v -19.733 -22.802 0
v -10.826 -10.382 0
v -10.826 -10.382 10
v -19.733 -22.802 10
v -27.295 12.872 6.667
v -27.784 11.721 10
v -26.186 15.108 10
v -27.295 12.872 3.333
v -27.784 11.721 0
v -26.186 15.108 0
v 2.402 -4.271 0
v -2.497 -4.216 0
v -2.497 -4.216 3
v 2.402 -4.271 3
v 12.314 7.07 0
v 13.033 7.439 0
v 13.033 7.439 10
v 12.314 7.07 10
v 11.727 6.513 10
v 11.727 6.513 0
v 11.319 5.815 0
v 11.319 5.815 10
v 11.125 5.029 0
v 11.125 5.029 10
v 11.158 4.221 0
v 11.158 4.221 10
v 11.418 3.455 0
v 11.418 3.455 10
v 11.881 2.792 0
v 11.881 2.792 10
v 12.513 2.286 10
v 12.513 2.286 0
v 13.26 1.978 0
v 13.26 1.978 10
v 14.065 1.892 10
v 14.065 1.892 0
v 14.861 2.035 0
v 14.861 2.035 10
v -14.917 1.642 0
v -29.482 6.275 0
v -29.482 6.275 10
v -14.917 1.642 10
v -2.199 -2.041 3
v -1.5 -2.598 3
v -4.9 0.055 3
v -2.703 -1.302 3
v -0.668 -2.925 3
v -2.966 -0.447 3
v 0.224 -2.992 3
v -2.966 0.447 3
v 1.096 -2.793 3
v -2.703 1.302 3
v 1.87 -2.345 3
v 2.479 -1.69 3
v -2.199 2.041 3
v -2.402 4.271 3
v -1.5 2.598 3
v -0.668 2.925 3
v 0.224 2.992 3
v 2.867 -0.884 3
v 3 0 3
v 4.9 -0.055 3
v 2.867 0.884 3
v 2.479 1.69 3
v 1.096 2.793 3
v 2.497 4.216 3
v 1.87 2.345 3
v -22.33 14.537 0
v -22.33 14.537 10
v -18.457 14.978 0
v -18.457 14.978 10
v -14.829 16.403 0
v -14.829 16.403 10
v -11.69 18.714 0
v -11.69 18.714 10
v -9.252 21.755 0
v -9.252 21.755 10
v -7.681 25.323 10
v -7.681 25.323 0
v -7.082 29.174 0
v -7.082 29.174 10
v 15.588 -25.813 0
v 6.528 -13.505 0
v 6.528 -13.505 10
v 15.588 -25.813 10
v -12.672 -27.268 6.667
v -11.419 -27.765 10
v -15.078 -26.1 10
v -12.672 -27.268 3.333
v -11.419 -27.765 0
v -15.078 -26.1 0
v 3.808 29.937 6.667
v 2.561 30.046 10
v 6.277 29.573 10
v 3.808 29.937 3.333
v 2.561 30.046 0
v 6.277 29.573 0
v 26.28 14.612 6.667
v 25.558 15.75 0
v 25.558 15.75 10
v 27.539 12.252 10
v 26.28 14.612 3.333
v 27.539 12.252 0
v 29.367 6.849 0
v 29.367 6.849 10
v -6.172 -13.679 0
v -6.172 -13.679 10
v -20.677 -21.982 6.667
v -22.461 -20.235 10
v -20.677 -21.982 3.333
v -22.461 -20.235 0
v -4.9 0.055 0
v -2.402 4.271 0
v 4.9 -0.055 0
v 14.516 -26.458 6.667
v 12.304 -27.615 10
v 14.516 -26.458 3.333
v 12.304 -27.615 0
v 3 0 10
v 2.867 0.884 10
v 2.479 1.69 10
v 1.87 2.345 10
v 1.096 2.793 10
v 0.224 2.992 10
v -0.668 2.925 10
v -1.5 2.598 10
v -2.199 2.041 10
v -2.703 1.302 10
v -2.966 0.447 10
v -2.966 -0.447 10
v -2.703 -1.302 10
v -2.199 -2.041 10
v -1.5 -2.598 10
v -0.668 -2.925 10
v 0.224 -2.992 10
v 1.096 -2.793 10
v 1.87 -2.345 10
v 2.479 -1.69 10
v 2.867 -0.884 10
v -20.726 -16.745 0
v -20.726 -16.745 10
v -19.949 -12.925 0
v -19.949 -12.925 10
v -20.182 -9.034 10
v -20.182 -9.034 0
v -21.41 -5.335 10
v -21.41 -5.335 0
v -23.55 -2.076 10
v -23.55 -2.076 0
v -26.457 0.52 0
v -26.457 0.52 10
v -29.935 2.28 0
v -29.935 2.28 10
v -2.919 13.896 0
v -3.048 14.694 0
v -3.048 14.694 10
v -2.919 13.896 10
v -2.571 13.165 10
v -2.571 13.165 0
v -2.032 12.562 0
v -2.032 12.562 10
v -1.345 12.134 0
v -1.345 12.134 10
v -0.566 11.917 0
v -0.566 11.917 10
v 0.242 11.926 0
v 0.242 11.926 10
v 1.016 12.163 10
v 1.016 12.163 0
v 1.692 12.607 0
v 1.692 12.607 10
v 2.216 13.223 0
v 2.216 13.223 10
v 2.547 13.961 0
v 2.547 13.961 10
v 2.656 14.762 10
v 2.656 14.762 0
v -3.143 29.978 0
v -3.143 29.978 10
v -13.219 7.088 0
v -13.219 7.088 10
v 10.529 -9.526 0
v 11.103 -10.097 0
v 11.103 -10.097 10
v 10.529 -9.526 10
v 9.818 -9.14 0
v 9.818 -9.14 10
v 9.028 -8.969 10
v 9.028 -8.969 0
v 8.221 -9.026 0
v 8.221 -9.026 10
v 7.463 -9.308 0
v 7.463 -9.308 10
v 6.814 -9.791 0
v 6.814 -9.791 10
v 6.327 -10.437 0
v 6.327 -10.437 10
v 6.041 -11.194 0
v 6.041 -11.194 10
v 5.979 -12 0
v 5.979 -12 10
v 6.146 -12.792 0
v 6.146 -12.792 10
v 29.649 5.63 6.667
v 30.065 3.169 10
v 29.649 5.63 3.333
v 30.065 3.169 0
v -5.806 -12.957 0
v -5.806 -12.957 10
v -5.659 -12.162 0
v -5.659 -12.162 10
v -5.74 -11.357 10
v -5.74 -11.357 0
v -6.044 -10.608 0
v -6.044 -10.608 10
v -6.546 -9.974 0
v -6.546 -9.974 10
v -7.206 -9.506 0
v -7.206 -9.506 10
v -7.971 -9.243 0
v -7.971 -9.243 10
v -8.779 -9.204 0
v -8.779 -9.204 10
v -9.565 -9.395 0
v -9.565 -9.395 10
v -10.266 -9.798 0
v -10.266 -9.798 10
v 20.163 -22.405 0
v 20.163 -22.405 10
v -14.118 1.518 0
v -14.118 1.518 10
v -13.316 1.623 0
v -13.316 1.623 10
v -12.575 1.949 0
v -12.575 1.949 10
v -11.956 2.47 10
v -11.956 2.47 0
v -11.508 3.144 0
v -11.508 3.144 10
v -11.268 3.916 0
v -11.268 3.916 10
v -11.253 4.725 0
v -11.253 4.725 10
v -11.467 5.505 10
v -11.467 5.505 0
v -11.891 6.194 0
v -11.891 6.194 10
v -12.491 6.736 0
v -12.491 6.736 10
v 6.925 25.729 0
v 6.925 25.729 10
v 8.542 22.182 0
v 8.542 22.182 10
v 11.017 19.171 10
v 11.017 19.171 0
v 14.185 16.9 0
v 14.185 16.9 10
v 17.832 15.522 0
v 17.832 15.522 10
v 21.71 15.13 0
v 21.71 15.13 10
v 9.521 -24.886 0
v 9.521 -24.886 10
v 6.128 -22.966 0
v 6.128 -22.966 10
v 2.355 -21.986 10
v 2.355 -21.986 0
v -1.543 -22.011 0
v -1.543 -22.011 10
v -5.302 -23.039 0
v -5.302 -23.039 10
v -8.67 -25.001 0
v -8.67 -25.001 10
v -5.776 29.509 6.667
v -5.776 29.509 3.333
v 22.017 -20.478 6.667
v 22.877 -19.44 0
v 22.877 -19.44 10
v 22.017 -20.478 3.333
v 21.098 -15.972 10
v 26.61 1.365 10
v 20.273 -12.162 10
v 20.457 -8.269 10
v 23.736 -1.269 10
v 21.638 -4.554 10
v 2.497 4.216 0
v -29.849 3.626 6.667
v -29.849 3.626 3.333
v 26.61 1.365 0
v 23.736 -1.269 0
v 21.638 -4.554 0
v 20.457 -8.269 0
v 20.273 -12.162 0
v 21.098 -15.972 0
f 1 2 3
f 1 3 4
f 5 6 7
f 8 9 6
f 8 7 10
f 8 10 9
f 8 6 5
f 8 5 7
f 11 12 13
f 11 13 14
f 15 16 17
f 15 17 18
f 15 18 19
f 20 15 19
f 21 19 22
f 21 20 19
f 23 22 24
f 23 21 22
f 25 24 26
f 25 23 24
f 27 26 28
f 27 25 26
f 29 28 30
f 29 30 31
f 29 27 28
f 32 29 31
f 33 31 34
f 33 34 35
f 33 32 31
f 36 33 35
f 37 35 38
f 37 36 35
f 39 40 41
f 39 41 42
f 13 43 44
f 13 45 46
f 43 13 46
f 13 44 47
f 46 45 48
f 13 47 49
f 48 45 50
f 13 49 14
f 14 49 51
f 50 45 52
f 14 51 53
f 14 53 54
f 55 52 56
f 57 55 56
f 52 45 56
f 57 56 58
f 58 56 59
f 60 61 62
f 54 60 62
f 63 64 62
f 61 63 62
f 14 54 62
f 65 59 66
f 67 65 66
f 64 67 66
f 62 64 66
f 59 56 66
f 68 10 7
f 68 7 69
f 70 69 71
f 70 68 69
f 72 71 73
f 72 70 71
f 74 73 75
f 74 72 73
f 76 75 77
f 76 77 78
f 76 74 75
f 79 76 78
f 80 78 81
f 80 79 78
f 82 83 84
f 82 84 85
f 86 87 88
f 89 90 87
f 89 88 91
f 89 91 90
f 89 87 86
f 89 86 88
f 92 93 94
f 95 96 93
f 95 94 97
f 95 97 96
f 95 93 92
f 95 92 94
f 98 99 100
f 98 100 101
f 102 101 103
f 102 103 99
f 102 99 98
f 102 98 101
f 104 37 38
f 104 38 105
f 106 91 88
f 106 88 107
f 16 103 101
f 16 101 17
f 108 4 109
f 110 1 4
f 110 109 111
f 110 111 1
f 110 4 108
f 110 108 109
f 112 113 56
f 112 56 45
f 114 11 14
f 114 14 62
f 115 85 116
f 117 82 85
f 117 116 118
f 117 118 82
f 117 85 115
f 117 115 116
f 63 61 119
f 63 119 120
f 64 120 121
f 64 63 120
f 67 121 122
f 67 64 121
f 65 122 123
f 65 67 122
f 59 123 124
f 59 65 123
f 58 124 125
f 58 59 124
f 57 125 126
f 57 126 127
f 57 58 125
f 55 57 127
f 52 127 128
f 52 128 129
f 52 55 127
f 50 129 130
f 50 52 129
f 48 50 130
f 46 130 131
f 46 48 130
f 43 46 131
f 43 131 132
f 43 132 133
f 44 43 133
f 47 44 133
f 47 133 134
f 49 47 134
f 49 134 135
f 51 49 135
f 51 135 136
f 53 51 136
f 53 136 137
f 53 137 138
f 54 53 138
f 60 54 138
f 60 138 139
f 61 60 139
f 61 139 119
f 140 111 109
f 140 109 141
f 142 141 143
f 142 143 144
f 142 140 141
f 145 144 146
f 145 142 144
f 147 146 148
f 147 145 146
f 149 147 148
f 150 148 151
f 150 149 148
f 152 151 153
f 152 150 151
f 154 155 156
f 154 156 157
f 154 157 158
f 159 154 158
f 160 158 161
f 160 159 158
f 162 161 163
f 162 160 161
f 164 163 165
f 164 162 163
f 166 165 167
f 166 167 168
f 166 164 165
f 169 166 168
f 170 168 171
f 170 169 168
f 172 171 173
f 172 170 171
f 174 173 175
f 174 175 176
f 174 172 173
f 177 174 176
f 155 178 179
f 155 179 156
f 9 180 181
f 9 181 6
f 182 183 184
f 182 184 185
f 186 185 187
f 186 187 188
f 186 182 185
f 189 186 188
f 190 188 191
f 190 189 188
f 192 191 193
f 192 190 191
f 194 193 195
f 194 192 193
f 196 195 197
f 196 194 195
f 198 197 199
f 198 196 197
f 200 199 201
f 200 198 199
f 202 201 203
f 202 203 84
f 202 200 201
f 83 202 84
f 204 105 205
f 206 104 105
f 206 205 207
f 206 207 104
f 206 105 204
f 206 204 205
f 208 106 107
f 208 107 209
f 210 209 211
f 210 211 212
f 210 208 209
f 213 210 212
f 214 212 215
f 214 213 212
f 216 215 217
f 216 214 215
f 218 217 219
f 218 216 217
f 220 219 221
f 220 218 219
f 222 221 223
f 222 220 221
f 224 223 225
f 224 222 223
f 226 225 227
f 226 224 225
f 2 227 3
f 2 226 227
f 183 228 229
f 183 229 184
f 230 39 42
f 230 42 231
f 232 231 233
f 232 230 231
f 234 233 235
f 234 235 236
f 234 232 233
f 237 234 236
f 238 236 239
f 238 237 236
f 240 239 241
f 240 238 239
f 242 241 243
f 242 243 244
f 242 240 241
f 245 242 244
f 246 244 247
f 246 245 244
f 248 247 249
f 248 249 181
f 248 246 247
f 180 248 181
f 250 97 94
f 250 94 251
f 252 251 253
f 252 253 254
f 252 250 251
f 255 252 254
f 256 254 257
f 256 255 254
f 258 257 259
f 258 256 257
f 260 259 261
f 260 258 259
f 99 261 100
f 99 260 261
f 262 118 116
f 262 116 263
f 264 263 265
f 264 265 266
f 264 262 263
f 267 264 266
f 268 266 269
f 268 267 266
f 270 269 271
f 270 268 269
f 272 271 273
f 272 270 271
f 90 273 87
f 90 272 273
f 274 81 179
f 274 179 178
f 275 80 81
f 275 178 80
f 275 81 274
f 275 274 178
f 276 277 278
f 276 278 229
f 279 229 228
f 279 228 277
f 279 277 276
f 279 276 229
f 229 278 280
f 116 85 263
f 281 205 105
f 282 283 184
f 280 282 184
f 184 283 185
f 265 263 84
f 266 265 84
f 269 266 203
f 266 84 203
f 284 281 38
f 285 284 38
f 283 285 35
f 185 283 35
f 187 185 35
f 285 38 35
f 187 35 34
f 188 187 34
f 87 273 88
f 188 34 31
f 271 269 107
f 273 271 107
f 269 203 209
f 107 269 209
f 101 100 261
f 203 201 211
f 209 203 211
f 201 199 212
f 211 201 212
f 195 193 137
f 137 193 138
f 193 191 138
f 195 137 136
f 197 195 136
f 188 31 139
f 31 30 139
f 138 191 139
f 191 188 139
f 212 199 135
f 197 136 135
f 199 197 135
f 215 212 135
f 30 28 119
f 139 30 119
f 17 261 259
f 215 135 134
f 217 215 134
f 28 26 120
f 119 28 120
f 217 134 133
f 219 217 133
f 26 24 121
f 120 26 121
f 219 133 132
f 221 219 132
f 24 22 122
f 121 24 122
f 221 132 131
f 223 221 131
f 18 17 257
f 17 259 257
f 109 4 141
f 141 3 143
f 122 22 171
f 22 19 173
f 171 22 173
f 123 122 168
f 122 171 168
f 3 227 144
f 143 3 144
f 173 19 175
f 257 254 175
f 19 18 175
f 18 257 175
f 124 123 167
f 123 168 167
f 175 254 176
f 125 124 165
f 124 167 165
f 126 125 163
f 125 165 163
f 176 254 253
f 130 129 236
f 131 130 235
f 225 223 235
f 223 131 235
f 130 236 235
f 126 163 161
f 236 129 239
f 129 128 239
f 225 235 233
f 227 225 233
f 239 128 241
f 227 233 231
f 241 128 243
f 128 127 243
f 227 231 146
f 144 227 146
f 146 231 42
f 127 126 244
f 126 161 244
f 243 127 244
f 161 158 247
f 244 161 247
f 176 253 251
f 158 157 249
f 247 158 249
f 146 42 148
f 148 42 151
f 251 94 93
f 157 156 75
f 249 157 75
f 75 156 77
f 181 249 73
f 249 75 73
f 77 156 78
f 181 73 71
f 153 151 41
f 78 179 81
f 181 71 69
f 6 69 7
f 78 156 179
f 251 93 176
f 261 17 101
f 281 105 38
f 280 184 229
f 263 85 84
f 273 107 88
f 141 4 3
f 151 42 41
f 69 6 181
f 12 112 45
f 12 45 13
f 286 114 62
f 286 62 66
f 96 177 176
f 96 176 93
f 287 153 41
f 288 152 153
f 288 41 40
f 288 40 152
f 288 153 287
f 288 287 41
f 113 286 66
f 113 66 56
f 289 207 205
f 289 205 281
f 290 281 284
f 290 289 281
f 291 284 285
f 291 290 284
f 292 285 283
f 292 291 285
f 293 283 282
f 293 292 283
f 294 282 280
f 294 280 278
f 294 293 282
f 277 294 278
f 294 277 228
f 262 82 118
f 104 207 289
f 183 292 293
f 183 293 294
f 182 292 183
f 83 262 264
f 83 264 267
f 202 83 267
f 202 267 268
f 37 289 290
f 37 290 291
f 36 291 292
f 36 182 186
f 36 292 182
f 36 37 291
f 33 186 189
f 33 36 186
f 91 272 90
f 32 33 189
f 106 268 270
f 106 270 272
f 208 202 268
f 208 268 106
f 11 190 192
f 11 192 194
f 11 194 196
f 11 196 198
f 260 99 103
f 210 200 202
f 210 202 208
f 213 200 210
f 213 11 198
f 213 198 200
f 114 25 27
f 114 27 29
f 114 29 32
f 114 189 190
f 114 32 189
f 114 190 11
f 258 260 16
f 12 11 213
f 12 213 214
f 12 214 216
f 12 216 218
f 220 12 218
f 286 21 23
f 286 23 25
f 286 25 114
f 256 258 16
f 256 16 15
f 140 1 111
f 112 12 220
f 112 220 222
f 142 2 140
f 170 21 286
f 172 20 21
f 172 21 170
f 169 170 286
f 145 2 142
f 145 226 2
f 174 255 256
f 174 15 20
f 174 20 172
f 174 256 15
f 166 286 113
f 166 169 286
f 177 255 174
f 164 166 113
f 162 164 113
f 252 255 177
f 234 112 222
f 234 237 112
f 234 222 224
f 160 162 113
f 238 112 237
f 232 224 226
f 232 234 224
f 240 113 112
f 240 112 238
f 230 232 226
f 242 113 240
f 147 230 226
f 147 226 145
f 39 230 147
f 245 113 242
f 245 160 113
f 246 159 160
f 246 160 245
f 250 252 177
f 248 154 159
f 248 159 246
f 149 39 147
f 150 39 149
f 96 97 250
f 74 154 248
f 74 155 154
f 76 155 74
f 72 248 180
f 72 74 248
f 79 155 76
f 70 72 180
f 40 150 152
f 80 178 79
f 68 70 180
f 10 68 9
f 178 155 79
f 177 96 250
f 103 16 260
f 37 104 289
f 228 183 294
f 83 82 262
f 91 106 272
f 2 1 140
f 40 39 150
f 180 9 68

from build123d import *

# Parameters (mm, degrees)
MODEL_R                 = 3
BOSS_EXTRUDE3_DEPTH     = 10
CUT_EXTRUDE1_DEPTH      = 3
CUT_EXTRUDE1_DEPTH_BACK = 3


with BuildPart() as part:
    # Model → Boss-Extrude3 (new body)
    with BuildSketch(Plane.XY):
        with BuildLine():
            add(Edge.make_bspline(
                [(-27.783884398, 11.720720152), (-27.312273784, 12.880782387), (-26.795019787, 14.018174114), (-26.185754442, 15.108459083)],
                knots=[0.852290179, 0.852290179, 0.852290179, 0.852290179, 0.87243197, 0.87243197, 0.87243197, 0.87243197], degree=3))
            ThreePointArc((-26.185754442, 15.108459083), (-13.183686547, 17.45567821), (-7.081525862, 29.174331808))
            add(Edge.make_bspline(
                [(-7.081525862, 29.174331808), (-5.777480255, 29.53777265), (-4.469238519, 29.818781923), (-3.142641746, 29.977736074)],
                knots=[0, 0, 0, 0, 0.021616293, 0.021616293, 0.021616293, 0.021616293], degree=3))
            Line((-3.142641746, 29.977736074), (-3.047607508, 14.694279391))
            ThreePointArc((-3.047607508, 14.694279391), (-0.161689439, 11.892698747), (2.656409066, 14.762489335))
            Line((2.656409066, 14.762489335), (2.561374827, 30.045946018))
            add(Edge.make_bspline(
                [(2.561374827, 30.045946018), (3.81039527, 29.955896616), (5.051959359, 29.815432204), (6.277155329, 29.572903012)],
                knots=[0.052290179, 0.052290179, 0.052290179, 0.052290179, 0.07243197, 0.07243197, 0.07243197, 0.07243197], degree=3))
            ThreePointArc((6.277155329, 29.572903012), (12.527353316, 17.932532214), (25.558126537, 15.750295644))
            add(Edge.make_bspline(
                [(25.558126537, 15.750295644), (26.306751572, 14.62238397), (26.978276202, 13.465008783), (27.53939153, 12.252459811)],
                knots=[0.2, 0.2, 0.2, 0.2, 0.221616293, 0.221616293, 0.221616293, 0.221616293], degree=3))
            Line((27.53939153, 12.252459811), (13.033327655, 7.439229031))
            ThreePointArc((13.033327655, 7.439229031), (11.260663856, 3.828821816), (14.860837224, 2.035464932))
            Line((14.860837224, 2.035464932), (29.366901099, 6.848695711))
            add(Edge.make_bspline(
                [(29.366901099, 6.848695711), (29.667227572, 5.632979885), (29.91730238, 4.408776378), (30.065249788, 3.168600124)],
                knots=[0.252290179, 0.252290179, 0.252290179, 0.252290179, 0.27243197, 0.27243197, 0.27243197, 0.27243197], degree=3))
            ThreePointArc((30.065249788, 3.168600124), (20.926016685, -6.372763797), (22.87731675, -19.440113767))
            add(Edge.make_bspline(
                [(22.87731675, -19.440113767), (22.03594686, -20.50064236), (21.14273017, -21.496948837), (20.162921741, -22.405299465)],
                knots=[0.4, 0.4, 0.4, 0.4, 0.421616293, 0.421616293, 0.421616293, 0.421616293], degree=3))
            Line((20.162921741, -22.405299465), (11.102646985, -10.096582999))
            ThreePointArc((11.102646985, -10.096582999), (7.121162438, -9.526356728), (6.52809344, -13.504502824))
            Line((6.52809344, -13.504502824), (15.588368196, -25.81321929))
            add(Edge.make_bspline(
                [(15.588368196, -25.81321929), (14.524959722, -26.474523589), (13.437950364, -27.090658554), (12.30419092, -27.614600438)],
                knots=[0.452290179, 0.452290179, 0.452290179, 0.452290179, 0.47243197, 0.47243197, 0.47243197, 0.47243197], degree=3))
            ThreePointArc((12.30419092, -27.614600438), (0.405636244, -21.871116843), (-11.419167214, -27.764946697))
            add(Edge.make_bspline(
                [(-11.419167214, -27.764946697), (-12.687787438, -27.292477739), (-13.911350342, -26.750853818), (-15.078020581, -26.099696408)],
                knots=[0.6, 0.6, 0.6, 0.6, 0.621616293, 0.621616293, 0.621616293, 0.621616293], degree=3))
            Line((-15.078020581, -26.099696408), (-6.171514453, -13.679260495))
            ThreePointArc((-6.171514453, -13.679260495), (-6.85954343, -9.716434063), (-10.826253597, -10.381706678))
            Line((-10.826253597, -10.381706678), (-19.732759725, -22.802142592))
            add(Edge.make_bspline(
                [(-19.732759725, -22.802142592), (-20.690308779, -21.995135299), (-21.612192316, -21.151724141), (-22.460841595, -20.235361781)],
                knots=[0.652290179, 0.652290179, 0.652290179, 0.652290179, 0.67243197, 0.67243197, 0.67243197, 0.67243197], degree=3))
            ThreePointArc((-22.460841595, -20.235361781), (-20.675319699, -7.144329784), (-29.934750212, 2.280433012))
            add(Edge.make_bspline(
                [(-29.934750212, 2.280433012), (-29.877430739, 3.63296348), (-29.740417511, 4.964011949), (-29.481650943, 6.274799988)],
                knots=[0.8, 0.8, 0.8, 0.8, 0.821616293, 0.821616293, 0.821616293, 0.821616293], degree=3))
            Line((-29.481650943, 6.274799988), (-14.916852679, 1.642335072))
            ThreePointArc((-14.916852679, 1.642335072), (-11.360593424, 3.521270227), (-13.219086134, 7.088255236))
            Line((-13.219086134, 7.088255236), (-27.783884398, 11.720720152))
        make_face()
        Circle(MODEL_R, mode=Mode.SUBTRACT)
    extrude(amount=BOSS_EXTRUDE3_DEPTH)

    # Sketch2 → Cut-Extrude1 (cut, two sides)
    with BuildSketch(Plane.XY) as cut_extrude1_sk:
        Polygon((-2.402263966, 4.270729193), (-4.899691957, 0.054942975), (-2.497427991, -4.215786218), (2.402263966, -4.270729193), (4.899691957, -0.054942975), (2.497427991, 4.215786218), align=None)
    extrude(amount=CUT_EXTRUDE1_DEPTH, mode=Mode.SUBTRACT)
    extrude(cut_extrude1_sk.sketch, amount=-CUT_EXTRUDE1_DEPTH_BACK, mode=Mode.SUBTRACT)


solid = part.part
